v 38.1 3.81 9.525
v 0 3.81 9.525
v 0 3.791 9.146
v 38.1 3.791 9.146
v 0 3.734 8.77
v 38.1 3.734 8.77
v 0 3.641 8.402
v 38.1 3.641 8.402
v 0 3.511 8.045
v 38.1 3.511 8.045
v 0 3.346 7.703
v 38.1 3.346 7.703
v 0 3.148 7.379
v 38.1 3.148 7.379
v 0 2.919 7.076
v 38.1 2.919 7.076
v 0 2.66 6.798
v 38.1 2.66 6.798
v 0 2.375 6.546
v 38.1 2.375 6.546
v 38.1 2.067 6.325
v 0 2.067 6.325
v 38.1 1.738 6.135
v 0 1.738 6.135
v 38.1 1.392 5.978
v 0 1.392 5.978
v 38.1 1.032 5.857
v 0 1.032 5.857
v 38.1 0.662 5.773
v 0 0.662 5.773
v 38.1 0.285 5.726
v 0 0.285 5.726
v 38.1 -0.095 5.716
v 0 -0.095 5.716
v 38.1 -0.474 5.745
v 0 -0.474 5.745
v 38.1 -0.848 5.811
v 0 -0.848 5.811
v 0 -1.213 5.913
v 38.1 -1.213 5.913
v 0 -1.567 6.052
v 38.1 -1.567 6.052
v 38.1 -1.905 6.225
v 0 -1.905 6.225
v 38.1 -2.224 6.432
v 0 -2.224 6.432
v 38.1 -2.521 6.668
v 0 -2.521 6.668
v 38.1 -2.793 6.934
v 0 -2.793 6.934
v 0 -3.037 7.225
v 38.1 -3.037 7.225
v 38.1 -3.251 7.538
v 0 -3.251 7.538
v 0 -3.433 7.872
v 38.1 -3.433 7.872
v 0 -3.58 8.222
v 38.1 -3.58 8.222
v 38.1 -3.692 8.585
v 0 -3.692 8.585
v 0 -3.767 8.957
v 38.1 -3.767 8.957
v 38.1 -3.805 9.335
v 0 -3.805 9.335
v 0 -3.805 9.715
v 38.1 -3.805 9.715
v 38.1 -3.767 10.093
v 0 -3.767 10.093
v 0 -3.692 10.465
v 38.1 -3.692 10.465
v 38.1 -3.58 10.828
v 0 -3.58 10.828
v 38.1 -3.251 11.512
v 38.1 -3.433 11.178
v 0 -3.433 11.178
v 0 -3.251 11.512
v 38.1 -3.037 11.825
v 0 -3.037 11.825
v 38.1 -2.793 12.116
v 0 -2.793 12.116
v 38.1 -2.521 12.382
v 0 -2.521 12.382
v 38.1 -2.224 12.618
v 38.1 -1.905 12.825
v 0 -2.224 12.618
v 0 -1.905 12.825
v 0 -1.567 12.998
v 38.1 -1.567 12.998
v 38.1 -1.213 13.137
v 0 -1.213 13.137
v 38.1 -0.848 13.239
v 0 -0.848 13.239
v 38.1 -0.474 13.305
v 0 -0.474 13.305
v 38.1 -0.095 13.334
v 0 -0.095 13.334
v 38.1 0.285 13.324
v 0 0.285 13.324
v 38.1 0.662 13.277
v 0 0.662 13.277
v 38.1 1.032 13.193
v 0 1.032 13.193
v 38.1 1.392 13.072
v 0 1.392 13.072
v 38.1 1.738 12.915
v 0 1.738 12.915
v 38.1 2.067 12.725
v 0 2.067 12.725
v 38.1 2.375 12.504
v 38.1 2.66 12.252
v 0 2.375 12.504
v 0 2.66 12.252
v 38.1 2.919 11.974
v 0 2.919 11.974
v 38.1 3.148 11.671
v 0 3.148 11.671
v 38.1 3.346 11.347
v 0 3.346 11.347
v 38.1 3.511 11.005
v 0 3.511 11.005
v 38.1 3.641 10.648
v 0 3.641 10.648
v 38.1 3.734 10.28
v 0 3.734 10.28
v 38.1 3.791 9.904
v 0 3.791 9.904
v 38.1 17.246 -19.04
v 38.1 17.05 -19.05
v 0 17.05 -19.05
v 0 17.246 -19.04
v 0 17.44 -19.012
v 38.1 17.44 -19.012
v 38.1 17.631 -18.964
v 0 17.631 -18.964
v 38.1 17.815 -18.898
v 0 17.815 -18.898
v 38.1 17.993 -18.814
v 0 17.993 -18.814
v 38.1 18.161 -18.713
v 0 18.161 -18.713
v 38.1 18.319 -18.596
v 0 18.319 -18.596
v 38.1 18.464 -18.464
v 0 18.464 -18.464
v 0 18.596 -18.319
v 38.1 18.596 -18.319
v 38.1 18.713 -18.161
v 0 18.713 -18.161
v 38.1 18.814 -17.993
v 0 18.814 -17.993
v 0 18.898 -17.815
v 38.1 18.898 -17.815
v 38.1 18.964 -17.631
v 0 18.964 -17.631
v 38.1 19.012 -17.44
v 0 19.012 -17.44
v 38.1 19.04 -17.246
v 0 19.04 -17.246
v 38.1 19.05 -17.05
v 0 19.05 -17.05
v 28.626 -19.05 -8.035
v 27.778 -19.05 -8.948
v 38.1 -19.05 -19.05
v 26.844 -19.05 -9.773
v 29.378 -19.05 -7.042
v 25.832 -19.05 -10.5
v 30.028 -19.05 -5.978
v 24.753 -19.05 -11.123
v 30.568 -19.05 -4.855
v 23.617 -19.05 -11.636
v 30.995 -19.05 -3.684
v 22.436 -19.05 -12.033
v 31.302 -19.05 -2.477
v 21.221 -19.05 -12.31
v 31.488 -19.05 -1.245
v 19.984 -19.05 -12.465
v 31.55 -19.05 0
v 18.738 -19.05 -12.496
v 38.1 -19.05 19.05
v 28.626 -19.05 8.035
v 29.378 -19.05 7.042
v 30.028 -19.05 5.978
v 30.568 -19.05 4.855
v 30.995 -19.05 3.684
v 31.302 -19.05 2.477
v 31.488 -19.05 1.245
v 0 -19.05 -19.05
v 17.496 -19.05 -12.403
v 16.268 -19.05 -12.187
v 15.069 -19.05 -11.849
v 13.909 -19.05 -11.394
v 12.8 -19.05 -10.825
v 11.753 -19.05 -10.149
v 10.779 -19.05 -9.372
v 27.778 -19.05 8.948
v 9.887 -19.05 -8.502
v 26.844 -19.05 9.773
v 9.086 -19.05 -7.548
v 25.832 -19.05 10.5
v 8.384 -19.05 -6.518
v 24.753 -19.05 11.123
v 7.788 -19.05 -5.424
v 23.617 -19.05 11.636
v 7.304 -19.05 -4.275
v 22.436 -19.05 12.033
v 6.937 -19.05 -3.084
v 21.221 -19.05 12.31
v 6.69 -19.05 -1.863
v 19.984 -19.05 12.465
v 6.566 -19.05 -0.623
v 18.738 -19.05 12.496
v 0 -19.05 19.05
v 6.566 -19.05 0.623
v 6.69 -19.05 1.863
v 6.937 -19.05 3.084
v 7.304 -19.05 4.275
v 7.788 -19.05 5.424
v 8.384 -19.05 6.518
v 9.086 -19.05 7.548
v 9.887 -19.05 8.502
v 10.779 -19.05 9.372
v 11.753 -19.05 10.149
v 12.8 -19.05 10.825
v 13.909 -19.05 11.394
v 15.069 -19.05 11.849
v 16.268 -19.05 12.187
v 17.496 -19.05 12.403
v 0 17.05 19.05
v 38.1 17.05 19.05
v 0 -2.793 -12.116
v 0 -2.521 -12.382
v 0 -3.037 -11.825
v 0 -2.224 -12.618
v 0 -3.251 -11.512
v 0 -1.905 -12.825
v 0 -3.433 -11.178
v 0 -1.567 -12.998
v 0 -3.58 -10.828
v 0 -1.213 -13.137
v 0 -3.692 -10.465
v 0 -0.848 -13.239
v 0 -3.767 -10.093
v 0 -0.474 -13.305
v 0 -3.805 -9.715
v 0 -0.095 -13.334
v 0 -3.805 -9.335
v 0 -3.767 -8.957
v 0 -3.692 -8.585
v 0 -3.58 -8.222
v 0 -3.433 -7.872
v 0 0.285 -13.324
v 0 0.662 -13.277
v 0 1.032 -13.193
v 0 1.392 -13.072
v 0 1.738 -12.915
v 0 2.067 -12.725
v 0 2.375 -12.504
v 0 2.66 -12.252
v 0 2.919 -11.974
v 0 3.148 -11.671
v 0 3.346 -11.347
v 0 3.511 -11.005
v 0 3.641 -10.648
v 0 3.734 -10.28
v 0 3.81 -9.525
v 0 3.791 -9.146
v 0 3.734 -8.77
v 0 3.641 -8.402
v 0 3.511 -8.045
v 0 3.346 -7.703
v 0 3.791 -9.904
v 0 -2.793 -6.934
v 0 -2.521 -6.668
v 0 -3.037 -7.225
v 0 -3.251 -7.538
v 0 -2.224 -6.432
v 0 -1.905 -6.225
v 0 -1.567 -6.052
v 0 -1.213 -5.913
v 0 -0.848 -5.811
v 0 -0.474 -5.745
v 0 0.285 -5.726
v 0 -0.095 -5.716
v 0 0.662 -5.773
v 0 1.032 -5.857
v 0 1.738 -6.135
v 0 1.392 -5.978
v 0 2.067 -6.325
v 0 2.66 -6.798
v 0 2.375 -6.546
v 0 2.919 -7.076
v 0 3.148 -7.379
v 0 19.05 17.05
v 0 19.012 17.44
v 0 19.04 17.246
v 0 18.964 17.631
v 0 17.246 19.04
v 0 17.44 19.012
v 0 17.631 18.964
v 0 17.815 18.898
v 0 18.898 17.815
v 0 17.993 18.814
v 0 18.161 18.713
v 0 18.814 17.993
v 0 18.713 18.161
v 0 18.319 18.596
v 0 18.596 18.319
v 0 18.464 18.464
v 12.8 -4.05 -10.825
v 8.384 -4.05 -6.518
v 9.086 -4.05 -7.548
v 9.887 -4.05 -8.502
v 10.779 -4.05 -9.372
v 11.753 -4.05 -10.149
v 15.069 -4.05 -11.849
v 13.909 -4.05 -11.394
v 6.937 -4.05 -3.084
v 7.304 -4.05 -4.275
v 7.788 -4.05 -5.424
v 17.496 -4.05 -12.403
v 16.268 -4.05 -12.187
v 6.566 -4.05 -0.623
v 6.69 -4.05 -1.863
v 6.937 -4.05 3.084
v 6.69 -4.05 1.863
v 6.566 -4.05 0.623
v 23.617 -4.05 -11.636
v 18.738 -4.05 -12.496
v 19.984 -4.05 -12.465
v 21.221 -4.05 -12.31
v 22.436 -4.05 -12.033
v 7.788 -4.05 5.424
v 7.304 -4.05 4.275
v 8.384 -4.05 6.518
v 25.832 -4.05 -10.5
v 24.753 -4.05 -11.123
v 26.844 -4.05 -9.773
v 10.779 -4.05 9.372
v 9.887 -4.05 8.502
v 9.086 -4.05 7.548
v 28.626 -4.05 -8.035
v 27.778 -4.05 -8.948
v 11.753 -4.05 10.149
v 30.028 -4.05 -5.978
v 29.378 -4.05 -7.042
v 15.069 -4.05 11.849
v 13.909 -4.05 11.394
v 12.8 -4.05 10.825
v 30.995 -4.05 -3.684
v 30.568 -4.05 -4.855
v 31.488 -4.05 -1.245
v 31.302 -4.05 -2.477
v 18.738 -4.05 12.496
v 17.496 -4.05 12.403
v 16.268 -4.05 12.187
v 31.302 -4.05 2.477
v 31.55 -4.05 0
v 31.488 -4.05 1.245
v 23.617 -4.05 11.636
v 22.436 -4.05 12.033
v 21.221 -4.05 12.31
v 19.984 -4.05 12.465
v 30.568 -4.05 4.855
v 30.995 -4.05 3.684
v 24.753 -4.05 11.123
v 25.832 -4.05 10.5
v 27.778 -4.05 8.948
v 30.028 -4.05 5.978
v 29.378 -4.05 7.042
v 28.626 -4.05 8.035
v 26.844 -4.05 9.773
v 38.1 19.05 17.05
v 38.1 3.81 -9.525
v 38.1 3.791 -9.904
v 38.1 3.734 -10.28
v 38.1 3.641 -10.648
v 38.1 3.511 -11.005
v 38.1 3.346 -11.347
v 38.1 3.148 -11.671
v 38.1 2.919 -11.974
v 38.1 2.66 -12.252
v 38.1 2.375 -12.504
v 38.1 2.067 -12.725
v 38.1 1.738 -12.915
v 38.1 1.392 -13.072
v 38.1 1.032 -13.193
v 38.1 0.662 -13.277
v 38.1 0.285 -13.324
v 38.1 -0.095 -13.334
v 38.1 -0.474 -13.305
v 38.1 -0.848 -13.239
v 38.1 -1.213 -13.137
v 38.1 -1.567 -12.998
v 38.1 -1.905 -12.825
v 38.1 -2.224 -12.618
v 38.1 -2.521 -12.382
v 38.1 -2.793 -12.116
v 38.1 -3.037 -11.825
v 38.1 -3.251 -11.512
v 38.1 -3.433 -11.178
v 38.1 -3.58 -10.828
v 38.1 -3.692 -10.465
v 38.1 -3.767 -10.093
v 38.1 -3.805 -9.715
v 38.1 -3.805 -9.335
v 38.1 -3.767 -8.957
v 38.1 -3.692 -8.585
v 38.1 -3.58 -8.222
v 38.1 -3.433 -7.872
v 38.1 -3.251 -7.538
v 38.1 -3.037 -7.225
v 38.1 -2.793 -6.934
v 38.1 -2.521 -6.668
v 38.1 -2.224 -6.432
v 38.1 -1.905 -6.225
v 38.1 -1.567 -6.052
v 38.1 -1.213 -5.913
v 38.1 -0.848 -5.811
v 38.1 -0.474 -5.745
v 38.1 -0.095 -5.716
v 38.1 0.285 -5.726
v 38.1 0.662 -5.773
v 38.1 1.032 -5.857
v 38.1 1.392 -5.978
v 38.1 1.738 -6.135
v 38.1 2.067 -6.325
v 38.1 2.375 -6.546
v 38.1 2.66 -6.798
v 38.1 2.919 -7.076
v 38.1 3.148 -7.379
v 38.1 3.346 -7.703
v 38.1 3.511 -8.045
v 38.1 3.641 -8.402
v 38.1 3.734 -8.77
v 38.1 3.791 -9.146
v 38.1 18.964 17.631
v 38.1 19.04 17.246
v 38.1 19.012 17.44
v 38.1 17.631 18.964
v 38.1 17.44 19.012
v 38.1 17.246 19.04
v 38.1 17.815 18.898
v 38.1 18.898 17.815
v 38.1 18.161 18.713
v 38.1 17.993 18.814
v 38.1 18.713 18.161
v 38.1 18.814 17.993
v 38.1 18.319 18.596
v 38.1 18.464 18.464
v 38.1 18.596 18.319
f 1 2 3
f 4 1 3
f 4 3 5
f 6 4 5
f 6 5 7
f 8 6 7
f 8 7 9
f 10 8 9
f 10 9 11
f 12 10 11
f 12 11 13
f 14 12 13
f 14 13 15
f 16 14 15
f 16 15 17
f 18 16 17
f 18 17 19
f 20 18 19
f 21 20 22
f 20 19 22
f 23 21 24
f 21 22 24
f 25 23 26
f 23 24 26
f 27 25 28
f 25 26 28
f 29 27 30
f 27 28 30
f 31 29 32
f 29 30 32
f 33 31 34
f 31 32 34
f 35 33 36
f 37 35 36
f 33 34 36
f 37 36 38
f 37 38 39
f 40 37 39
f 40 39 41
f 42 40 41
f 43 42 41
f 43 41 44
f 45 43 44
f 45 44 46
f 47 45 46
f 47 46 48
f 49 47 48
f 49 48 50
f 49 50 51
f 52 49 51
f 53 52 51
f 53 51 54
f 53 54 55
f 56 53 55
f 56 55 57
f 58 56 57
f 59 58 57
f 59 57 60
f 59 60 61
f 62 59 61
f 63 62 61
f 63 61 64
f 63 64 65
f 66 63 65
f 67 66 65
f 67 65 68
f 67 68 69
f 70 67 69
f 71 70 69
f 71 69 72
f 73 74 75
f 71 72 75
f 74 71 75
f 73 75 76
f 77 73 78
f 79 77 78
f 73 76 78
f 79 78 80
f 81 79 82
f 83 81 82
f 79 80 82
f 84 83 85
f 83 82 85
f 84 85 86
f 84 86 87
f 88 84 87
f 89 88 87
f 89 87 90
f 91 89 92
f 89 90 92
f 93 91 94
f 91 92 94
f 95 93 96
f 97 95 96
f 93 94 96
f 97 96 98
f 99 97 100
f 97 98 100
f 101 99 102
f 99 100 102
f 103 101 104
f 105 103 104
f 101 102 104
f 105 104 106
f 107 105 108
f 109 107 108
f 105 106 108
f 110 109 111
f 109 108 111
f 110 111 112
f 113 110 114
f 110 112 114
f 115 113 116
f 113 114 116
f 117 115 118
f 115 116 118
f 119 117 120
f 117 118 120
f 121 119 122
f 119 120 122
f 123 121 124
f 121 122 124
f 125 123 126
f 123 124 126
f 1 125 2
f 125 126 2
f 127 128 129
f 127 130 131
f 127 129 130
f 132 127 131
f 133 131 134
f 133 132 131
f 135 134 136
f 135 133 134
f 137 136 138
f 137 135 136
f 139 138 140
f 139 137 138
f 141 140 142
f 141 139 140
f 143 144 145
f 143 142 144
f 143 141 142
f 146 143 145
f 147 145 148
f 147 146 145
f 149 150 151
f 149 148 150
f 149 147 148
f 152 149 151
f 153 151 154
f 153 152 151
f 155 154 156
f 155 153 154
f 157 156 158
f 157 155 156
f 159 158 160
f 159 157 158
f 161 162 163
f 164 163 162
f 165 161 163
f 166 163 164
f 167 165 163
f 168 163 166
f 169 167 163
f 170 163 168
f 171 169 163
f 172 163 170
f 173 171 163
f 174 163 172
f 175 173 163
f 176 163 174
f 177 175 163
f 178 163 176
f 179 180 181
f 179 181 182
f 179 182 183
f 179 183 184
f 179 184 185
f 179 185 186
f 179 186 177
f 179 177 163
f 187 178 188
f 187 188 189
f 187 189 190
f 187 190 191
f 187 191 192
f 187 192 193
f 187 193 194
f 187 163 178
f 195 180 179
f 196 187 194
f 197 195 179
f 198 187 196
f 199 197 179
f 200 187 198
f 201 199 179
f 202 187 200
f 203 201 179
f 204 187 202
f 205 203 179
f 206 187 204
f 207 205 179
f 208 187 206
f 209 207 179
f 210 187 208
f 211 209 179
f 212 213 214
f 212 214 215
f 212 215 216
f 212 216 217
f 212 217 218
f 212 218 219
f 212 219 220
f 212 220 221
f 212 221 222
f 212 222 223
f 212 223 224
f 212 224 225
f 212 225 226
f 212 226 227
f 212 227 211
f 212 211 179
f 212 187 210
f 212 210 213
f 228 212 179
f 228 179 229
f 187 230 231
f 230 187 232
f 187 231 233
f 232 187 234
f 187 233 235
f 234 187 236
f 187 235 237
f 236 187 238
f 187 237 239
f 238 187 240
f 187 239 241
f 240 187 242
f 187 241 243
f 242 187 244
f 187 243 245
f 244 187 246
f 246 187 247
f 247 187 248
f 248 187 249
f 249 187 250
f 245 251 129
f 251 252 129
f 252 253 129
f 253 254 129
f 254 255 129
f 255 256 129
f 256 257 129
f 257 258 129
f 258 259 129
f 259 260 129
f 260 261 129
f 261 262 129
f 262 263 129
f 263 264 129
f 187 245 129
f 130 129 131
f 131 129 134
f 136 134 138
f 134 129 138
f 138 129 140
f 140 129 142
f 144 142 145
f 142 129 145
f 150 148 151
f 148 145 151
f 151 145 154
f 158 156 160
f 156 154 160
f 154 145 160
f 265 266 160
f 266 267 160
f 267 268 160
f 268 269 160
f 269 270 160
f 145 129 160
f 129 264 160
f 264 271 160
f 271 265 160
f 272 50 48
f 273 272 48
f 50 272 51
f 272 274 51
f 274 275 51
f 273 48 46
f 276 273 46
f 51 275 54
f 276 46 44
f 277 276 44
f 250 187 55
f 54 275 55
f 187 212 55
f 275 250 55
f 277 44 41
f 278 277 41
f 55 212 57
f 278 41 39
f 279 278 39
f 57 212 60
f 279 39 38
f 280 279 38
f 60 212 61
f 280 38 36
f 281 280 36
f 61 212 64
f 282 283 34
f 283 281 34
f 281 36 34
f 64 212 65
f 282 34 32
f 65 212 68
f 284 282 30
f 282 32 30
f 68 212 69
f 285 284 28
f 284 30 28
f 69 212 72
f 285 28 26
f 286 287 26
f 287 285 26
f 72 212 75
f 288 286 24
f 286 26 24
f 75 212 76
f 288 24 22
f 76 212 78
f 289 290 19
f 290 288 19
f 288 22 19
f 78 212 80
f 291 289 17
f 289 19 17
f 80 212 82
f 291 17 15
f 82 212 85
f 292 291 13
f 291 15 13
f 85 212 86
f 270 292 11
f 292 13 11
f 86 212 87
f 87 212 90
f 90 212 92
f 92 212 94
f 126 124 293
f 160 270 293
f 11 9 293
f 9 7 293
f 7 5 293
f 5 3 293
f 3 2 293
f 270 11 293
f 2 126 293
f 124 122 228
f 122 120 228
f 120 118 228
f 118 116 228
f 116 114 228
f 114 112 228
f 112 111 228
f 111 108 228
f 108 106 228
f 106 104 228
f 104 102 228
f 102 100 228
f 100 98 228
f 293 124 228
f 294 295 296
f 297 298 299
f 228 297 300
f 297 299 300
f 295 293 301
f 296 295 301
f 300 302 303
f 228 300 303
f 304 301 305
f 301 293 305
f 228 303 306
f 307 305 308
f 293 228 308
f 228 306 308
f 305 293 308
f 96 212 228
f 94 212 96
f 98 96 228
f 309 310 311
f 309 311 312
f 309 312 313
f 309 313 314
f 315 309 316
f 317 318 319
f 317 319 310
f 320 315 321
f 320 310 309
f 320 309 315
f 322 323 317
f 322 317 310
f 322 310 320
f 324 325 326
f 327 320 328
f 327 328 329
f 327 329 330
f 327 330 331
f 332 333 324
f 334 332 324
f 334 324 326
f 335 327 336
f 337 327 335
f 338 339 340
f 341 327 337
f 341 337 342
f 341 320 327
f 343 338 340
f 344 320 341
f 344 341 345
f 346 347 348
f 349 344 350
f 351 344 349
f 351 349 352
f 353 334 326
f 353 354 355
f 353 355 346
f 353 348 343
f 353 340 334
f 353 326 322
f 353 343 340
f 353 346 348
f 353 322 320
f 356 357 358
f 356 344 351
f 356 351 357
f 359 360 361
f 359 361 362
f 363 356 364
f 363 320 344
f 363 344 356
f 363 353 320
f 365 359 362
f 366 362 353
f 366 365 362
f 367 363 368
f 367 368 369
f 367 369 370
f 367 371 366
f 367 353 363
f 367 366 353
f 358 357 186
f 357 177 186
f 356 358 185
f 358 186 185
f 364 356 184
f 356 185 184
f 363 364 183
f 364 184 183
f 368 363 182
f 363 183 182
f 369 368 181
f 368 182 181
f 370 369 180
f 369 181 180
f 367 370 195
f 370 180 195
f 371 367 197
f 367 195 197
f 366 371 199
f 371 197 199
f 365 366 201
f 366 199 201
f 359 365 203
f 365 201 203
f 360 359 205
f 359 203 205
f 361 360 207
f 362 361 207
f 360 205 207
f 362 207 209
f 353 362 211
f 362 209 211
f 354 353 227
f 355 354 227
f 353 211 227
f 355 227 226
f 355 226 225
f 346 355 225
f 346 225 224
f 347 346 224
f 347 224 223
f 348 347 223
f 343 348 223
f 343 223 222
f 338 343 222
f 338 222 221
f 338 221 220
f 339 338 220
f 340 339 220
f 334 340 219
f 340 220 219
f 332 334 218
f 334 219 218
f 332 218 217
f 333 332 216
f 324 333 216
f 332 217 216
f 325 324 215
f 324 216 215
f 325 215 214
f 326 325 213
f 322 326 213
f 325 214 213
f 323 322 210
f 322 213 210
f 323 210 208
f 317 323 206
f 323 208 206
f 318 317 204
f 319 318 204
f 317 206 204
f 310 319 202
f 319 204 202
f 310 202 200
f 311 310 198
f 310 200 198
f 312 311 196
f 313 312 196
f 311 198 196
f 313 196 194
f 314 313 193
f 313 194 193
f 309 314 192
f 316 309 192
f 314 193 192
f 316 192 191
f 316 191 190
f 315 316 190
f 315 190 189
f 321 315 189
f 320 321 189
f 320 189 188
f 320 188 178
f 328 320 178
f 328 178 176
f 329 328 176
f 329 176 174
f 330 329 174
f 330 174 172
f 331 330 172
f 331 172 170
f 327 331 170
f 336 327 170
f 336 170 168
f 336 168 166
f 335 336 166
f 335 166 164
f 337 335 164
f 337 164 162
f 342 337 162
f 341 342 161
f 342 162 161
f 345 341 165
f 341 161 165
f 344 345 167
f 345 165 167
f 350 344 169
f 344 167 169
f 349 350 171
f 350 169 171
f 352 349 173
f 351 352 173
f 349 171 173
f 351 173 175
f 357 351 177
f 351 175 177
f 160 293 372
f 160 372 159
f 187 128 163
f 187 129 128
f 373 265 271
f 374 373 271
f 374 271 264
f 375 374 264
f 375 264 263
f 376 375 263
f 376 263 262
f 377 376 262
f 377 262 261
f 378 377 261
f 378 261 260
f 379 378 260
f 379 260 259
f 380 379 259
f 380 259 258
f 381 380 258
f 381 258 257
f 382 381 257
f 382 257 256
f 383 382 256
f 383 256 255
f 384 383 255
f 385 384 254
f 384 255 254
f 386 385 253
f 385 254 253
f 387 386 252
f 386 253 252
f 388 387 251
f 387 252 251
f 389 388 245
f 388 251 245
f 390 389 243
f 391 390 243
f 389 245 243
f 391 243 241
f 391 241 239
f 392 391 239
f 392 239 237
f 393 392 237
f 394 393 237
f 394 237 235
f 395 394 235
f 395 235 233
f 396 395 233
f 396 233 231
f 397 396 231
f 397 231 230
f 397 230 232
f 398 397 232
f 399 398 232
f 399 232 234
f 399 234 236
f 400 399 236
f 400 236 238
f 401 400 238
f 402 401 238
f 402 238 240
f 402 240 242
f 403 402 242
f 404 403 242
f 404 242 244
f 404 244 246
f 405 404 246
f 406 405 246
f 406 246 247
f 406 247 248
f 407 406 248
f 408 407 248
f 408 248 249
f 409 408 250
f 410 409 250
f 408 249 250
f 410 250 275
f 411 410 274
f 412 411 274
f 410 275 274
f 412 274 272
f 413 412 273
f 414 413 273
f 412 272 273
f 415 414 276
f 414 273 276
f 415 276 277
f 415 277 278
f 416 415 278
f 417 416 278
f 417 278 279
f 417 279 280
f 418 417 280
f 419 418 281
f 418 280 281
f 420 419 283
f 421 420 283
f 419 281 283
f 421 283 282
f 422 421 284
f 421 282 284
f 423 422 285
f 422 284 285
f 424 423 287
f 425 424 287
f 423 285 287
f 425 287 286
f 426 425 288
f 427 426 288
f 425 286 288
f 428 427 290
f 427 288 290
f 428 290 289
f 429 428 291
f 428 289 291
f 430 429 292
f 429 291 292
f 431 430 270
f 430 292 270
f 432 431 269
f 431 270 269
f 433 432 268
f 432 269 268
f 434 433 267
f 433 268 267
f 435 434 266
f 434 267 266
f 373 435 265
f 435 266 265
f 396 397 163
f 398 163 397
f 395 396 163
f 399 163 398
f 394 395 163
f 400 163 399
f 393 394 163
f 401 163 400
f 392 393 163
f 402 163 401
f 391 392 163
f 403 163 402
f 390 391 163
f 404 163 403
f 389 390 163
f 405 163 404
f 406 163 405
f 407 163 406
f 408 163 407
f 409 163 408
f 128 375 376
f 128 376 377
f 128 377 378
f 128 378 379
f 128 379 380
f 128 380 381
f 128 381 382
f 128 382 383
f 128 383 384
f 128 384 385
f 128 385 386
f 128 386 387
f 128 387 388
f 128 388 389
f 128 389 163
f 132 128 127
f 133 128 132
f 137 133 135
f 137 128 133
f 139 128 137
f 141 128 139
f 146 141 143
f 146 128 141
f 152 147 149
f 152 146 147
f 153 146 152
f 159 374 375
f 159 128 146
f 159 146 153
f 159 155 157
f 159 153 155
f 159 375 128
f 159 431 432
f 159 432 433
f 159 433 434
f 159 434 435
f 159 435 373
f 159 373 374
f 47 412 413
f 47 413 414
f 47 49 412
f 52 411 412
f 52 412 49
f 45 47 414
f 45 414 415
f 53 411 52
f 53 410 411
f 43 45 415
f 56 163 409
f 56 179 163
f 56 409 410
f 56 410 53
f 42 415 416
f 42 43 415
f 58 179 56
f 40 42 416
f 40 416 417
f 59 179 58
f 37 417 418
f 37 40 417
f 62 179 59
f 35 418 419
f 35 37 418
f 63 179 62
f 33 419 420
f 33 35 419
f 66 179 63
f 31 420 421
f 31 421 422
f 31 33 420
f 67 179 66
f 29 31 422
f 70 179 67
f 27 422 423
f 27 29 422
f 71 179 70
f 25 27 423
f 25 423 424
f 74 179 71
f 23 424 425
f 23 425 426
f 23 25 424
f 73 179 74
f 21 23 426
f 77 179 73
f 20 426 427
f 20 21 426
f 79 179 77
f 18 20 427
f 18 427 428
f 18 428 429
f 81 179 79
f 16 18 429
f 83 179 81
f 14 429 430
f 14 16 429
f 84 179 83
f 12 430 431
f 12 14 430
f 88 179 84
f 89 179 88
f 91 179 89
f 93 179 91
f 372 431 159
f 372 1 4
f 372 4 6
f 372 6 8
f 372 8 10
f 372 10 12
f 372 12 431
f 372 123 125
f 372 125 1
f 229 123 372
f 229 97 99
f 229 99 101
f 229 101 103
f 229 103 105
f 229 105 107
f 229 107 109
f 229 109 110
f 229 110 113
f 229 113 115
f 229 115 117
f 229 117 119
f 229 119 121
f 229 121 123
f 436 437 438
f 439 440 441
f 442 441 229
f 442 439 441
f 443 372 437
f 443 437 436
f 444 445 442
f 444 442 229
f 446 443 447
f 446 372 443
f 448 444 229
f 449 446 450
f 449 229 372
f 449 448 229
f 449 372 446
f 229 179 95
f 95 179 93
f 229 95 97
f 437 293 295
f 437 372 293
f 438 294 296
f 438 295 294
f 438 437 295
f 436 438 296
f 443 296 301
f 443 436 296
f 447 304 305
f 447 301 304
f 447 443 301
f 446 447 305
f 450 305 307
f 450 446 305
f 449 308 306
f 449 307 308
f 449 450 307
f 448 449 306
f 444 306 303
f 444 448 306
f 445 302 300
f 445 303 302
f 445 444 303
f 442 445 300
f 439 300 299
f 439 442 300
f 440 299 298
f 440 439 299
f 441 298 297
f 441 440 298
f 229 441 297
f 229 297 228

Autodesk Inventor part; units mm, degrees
ref_plane "YZ Plane" through (0, 0, 0) normal (1, 0, 0) x (0, 1, 0)
ref_plane "XZ Plane" through (0, 0, 0) normal (0, 1, 0) x (-1, 0, 0)
ref_plane "XY Plane" through (0, 0, 0) normal (0, 0, 1) x (1, 0, 0)
sketch "Sketch1" plane through (0, 0, 0) normal (1, 0, 0) x (0, 1, 0)
  line L0 (-19.05, 19.05) -> (19.05, 19.05)
  line L1 (19.05, 19.05) -> (19.05, -19.05)
  line L2 (19.05, -19.05) -> (-19.05, -19.05)
  line L3 (-19.05, -19.05) -> (-19.05, 19.05)
  line L4 (-19.05, 19.05) -> (19.05, -19.05) construction
  line L5 (19.05, 19.05) -> (-19.05, -19.05) construction
  line L6 (19.05, 19.05) -> (-19.05, -19.05)
  line L7 (19.05, -19.05) -> (-19.05, 19.05)
  line L8 (0, 0) -> (0, -19.05)
  line L9 (0, 0) -> (0, 19.05)
  circle A0 centre (0, 9.525) radius 3.81
  circle A1 centre (0, -9.525) radius 3.81
  dimension "d0" = 38.1
  dimension "d1" = 38.1
  dimension "d2" = 7.62
  dimension "d3" = 7.62
  dimension "d4" = 19.05
extrude "Extrusion1" add sketch "Sketch1" along normal blind 38.1 contours L7 L6 L3 | L0 L9 A0 L7 | L0 L6 L9 A0 | L6 L8 A1 L2 | L6 L1 L7 | L7 L2 L8 A1
sketch "Sketch2" plane through (0, -19.05, -19.05) normal (0, -1, 0) x (1, 0, 0)
  line L0 (38.1, 0) -> (38.1, 38.1) projected
  line L1 (0, 0) -> (38.1, 0) projected
  line L2 (38.1, 38.1) -> (38.1, 0)
  line L3 (38.1, 0) -> (0, 0)
  line L4 (0, 0) -> (0, 38.1) projected
  line L5 (0, 0) -> (0, 38.1)
  line L6 (0, 38.1) -> (38.1, 38.1)
  line L7 (0, 38.1) -> (38.1, 38.1) projected
  line L8 (0, 0) -> (38.1, 38.1)
  line L9 (38.1, 0) -> (0, 38.1)
  circle A0 centre (19.05, 19.05) radius 12.5
  point P0 (0, 19.05)
  dimension "d7" = 25
extrude "Extrusion2" cut sketch "Sketch2" against normal blind 15 contours A0 L8 L9 | L9 L8 A0 | L8 L9 A0 | A0 L9 L8
fillet "Fillet1" radius 2 1 edges at (19.05, 19.05, 19.05)
fillet "Fillet2" radius 2 1 edges at (19.05, 19.05, -19.05)
properties part number "cube fixation2"
